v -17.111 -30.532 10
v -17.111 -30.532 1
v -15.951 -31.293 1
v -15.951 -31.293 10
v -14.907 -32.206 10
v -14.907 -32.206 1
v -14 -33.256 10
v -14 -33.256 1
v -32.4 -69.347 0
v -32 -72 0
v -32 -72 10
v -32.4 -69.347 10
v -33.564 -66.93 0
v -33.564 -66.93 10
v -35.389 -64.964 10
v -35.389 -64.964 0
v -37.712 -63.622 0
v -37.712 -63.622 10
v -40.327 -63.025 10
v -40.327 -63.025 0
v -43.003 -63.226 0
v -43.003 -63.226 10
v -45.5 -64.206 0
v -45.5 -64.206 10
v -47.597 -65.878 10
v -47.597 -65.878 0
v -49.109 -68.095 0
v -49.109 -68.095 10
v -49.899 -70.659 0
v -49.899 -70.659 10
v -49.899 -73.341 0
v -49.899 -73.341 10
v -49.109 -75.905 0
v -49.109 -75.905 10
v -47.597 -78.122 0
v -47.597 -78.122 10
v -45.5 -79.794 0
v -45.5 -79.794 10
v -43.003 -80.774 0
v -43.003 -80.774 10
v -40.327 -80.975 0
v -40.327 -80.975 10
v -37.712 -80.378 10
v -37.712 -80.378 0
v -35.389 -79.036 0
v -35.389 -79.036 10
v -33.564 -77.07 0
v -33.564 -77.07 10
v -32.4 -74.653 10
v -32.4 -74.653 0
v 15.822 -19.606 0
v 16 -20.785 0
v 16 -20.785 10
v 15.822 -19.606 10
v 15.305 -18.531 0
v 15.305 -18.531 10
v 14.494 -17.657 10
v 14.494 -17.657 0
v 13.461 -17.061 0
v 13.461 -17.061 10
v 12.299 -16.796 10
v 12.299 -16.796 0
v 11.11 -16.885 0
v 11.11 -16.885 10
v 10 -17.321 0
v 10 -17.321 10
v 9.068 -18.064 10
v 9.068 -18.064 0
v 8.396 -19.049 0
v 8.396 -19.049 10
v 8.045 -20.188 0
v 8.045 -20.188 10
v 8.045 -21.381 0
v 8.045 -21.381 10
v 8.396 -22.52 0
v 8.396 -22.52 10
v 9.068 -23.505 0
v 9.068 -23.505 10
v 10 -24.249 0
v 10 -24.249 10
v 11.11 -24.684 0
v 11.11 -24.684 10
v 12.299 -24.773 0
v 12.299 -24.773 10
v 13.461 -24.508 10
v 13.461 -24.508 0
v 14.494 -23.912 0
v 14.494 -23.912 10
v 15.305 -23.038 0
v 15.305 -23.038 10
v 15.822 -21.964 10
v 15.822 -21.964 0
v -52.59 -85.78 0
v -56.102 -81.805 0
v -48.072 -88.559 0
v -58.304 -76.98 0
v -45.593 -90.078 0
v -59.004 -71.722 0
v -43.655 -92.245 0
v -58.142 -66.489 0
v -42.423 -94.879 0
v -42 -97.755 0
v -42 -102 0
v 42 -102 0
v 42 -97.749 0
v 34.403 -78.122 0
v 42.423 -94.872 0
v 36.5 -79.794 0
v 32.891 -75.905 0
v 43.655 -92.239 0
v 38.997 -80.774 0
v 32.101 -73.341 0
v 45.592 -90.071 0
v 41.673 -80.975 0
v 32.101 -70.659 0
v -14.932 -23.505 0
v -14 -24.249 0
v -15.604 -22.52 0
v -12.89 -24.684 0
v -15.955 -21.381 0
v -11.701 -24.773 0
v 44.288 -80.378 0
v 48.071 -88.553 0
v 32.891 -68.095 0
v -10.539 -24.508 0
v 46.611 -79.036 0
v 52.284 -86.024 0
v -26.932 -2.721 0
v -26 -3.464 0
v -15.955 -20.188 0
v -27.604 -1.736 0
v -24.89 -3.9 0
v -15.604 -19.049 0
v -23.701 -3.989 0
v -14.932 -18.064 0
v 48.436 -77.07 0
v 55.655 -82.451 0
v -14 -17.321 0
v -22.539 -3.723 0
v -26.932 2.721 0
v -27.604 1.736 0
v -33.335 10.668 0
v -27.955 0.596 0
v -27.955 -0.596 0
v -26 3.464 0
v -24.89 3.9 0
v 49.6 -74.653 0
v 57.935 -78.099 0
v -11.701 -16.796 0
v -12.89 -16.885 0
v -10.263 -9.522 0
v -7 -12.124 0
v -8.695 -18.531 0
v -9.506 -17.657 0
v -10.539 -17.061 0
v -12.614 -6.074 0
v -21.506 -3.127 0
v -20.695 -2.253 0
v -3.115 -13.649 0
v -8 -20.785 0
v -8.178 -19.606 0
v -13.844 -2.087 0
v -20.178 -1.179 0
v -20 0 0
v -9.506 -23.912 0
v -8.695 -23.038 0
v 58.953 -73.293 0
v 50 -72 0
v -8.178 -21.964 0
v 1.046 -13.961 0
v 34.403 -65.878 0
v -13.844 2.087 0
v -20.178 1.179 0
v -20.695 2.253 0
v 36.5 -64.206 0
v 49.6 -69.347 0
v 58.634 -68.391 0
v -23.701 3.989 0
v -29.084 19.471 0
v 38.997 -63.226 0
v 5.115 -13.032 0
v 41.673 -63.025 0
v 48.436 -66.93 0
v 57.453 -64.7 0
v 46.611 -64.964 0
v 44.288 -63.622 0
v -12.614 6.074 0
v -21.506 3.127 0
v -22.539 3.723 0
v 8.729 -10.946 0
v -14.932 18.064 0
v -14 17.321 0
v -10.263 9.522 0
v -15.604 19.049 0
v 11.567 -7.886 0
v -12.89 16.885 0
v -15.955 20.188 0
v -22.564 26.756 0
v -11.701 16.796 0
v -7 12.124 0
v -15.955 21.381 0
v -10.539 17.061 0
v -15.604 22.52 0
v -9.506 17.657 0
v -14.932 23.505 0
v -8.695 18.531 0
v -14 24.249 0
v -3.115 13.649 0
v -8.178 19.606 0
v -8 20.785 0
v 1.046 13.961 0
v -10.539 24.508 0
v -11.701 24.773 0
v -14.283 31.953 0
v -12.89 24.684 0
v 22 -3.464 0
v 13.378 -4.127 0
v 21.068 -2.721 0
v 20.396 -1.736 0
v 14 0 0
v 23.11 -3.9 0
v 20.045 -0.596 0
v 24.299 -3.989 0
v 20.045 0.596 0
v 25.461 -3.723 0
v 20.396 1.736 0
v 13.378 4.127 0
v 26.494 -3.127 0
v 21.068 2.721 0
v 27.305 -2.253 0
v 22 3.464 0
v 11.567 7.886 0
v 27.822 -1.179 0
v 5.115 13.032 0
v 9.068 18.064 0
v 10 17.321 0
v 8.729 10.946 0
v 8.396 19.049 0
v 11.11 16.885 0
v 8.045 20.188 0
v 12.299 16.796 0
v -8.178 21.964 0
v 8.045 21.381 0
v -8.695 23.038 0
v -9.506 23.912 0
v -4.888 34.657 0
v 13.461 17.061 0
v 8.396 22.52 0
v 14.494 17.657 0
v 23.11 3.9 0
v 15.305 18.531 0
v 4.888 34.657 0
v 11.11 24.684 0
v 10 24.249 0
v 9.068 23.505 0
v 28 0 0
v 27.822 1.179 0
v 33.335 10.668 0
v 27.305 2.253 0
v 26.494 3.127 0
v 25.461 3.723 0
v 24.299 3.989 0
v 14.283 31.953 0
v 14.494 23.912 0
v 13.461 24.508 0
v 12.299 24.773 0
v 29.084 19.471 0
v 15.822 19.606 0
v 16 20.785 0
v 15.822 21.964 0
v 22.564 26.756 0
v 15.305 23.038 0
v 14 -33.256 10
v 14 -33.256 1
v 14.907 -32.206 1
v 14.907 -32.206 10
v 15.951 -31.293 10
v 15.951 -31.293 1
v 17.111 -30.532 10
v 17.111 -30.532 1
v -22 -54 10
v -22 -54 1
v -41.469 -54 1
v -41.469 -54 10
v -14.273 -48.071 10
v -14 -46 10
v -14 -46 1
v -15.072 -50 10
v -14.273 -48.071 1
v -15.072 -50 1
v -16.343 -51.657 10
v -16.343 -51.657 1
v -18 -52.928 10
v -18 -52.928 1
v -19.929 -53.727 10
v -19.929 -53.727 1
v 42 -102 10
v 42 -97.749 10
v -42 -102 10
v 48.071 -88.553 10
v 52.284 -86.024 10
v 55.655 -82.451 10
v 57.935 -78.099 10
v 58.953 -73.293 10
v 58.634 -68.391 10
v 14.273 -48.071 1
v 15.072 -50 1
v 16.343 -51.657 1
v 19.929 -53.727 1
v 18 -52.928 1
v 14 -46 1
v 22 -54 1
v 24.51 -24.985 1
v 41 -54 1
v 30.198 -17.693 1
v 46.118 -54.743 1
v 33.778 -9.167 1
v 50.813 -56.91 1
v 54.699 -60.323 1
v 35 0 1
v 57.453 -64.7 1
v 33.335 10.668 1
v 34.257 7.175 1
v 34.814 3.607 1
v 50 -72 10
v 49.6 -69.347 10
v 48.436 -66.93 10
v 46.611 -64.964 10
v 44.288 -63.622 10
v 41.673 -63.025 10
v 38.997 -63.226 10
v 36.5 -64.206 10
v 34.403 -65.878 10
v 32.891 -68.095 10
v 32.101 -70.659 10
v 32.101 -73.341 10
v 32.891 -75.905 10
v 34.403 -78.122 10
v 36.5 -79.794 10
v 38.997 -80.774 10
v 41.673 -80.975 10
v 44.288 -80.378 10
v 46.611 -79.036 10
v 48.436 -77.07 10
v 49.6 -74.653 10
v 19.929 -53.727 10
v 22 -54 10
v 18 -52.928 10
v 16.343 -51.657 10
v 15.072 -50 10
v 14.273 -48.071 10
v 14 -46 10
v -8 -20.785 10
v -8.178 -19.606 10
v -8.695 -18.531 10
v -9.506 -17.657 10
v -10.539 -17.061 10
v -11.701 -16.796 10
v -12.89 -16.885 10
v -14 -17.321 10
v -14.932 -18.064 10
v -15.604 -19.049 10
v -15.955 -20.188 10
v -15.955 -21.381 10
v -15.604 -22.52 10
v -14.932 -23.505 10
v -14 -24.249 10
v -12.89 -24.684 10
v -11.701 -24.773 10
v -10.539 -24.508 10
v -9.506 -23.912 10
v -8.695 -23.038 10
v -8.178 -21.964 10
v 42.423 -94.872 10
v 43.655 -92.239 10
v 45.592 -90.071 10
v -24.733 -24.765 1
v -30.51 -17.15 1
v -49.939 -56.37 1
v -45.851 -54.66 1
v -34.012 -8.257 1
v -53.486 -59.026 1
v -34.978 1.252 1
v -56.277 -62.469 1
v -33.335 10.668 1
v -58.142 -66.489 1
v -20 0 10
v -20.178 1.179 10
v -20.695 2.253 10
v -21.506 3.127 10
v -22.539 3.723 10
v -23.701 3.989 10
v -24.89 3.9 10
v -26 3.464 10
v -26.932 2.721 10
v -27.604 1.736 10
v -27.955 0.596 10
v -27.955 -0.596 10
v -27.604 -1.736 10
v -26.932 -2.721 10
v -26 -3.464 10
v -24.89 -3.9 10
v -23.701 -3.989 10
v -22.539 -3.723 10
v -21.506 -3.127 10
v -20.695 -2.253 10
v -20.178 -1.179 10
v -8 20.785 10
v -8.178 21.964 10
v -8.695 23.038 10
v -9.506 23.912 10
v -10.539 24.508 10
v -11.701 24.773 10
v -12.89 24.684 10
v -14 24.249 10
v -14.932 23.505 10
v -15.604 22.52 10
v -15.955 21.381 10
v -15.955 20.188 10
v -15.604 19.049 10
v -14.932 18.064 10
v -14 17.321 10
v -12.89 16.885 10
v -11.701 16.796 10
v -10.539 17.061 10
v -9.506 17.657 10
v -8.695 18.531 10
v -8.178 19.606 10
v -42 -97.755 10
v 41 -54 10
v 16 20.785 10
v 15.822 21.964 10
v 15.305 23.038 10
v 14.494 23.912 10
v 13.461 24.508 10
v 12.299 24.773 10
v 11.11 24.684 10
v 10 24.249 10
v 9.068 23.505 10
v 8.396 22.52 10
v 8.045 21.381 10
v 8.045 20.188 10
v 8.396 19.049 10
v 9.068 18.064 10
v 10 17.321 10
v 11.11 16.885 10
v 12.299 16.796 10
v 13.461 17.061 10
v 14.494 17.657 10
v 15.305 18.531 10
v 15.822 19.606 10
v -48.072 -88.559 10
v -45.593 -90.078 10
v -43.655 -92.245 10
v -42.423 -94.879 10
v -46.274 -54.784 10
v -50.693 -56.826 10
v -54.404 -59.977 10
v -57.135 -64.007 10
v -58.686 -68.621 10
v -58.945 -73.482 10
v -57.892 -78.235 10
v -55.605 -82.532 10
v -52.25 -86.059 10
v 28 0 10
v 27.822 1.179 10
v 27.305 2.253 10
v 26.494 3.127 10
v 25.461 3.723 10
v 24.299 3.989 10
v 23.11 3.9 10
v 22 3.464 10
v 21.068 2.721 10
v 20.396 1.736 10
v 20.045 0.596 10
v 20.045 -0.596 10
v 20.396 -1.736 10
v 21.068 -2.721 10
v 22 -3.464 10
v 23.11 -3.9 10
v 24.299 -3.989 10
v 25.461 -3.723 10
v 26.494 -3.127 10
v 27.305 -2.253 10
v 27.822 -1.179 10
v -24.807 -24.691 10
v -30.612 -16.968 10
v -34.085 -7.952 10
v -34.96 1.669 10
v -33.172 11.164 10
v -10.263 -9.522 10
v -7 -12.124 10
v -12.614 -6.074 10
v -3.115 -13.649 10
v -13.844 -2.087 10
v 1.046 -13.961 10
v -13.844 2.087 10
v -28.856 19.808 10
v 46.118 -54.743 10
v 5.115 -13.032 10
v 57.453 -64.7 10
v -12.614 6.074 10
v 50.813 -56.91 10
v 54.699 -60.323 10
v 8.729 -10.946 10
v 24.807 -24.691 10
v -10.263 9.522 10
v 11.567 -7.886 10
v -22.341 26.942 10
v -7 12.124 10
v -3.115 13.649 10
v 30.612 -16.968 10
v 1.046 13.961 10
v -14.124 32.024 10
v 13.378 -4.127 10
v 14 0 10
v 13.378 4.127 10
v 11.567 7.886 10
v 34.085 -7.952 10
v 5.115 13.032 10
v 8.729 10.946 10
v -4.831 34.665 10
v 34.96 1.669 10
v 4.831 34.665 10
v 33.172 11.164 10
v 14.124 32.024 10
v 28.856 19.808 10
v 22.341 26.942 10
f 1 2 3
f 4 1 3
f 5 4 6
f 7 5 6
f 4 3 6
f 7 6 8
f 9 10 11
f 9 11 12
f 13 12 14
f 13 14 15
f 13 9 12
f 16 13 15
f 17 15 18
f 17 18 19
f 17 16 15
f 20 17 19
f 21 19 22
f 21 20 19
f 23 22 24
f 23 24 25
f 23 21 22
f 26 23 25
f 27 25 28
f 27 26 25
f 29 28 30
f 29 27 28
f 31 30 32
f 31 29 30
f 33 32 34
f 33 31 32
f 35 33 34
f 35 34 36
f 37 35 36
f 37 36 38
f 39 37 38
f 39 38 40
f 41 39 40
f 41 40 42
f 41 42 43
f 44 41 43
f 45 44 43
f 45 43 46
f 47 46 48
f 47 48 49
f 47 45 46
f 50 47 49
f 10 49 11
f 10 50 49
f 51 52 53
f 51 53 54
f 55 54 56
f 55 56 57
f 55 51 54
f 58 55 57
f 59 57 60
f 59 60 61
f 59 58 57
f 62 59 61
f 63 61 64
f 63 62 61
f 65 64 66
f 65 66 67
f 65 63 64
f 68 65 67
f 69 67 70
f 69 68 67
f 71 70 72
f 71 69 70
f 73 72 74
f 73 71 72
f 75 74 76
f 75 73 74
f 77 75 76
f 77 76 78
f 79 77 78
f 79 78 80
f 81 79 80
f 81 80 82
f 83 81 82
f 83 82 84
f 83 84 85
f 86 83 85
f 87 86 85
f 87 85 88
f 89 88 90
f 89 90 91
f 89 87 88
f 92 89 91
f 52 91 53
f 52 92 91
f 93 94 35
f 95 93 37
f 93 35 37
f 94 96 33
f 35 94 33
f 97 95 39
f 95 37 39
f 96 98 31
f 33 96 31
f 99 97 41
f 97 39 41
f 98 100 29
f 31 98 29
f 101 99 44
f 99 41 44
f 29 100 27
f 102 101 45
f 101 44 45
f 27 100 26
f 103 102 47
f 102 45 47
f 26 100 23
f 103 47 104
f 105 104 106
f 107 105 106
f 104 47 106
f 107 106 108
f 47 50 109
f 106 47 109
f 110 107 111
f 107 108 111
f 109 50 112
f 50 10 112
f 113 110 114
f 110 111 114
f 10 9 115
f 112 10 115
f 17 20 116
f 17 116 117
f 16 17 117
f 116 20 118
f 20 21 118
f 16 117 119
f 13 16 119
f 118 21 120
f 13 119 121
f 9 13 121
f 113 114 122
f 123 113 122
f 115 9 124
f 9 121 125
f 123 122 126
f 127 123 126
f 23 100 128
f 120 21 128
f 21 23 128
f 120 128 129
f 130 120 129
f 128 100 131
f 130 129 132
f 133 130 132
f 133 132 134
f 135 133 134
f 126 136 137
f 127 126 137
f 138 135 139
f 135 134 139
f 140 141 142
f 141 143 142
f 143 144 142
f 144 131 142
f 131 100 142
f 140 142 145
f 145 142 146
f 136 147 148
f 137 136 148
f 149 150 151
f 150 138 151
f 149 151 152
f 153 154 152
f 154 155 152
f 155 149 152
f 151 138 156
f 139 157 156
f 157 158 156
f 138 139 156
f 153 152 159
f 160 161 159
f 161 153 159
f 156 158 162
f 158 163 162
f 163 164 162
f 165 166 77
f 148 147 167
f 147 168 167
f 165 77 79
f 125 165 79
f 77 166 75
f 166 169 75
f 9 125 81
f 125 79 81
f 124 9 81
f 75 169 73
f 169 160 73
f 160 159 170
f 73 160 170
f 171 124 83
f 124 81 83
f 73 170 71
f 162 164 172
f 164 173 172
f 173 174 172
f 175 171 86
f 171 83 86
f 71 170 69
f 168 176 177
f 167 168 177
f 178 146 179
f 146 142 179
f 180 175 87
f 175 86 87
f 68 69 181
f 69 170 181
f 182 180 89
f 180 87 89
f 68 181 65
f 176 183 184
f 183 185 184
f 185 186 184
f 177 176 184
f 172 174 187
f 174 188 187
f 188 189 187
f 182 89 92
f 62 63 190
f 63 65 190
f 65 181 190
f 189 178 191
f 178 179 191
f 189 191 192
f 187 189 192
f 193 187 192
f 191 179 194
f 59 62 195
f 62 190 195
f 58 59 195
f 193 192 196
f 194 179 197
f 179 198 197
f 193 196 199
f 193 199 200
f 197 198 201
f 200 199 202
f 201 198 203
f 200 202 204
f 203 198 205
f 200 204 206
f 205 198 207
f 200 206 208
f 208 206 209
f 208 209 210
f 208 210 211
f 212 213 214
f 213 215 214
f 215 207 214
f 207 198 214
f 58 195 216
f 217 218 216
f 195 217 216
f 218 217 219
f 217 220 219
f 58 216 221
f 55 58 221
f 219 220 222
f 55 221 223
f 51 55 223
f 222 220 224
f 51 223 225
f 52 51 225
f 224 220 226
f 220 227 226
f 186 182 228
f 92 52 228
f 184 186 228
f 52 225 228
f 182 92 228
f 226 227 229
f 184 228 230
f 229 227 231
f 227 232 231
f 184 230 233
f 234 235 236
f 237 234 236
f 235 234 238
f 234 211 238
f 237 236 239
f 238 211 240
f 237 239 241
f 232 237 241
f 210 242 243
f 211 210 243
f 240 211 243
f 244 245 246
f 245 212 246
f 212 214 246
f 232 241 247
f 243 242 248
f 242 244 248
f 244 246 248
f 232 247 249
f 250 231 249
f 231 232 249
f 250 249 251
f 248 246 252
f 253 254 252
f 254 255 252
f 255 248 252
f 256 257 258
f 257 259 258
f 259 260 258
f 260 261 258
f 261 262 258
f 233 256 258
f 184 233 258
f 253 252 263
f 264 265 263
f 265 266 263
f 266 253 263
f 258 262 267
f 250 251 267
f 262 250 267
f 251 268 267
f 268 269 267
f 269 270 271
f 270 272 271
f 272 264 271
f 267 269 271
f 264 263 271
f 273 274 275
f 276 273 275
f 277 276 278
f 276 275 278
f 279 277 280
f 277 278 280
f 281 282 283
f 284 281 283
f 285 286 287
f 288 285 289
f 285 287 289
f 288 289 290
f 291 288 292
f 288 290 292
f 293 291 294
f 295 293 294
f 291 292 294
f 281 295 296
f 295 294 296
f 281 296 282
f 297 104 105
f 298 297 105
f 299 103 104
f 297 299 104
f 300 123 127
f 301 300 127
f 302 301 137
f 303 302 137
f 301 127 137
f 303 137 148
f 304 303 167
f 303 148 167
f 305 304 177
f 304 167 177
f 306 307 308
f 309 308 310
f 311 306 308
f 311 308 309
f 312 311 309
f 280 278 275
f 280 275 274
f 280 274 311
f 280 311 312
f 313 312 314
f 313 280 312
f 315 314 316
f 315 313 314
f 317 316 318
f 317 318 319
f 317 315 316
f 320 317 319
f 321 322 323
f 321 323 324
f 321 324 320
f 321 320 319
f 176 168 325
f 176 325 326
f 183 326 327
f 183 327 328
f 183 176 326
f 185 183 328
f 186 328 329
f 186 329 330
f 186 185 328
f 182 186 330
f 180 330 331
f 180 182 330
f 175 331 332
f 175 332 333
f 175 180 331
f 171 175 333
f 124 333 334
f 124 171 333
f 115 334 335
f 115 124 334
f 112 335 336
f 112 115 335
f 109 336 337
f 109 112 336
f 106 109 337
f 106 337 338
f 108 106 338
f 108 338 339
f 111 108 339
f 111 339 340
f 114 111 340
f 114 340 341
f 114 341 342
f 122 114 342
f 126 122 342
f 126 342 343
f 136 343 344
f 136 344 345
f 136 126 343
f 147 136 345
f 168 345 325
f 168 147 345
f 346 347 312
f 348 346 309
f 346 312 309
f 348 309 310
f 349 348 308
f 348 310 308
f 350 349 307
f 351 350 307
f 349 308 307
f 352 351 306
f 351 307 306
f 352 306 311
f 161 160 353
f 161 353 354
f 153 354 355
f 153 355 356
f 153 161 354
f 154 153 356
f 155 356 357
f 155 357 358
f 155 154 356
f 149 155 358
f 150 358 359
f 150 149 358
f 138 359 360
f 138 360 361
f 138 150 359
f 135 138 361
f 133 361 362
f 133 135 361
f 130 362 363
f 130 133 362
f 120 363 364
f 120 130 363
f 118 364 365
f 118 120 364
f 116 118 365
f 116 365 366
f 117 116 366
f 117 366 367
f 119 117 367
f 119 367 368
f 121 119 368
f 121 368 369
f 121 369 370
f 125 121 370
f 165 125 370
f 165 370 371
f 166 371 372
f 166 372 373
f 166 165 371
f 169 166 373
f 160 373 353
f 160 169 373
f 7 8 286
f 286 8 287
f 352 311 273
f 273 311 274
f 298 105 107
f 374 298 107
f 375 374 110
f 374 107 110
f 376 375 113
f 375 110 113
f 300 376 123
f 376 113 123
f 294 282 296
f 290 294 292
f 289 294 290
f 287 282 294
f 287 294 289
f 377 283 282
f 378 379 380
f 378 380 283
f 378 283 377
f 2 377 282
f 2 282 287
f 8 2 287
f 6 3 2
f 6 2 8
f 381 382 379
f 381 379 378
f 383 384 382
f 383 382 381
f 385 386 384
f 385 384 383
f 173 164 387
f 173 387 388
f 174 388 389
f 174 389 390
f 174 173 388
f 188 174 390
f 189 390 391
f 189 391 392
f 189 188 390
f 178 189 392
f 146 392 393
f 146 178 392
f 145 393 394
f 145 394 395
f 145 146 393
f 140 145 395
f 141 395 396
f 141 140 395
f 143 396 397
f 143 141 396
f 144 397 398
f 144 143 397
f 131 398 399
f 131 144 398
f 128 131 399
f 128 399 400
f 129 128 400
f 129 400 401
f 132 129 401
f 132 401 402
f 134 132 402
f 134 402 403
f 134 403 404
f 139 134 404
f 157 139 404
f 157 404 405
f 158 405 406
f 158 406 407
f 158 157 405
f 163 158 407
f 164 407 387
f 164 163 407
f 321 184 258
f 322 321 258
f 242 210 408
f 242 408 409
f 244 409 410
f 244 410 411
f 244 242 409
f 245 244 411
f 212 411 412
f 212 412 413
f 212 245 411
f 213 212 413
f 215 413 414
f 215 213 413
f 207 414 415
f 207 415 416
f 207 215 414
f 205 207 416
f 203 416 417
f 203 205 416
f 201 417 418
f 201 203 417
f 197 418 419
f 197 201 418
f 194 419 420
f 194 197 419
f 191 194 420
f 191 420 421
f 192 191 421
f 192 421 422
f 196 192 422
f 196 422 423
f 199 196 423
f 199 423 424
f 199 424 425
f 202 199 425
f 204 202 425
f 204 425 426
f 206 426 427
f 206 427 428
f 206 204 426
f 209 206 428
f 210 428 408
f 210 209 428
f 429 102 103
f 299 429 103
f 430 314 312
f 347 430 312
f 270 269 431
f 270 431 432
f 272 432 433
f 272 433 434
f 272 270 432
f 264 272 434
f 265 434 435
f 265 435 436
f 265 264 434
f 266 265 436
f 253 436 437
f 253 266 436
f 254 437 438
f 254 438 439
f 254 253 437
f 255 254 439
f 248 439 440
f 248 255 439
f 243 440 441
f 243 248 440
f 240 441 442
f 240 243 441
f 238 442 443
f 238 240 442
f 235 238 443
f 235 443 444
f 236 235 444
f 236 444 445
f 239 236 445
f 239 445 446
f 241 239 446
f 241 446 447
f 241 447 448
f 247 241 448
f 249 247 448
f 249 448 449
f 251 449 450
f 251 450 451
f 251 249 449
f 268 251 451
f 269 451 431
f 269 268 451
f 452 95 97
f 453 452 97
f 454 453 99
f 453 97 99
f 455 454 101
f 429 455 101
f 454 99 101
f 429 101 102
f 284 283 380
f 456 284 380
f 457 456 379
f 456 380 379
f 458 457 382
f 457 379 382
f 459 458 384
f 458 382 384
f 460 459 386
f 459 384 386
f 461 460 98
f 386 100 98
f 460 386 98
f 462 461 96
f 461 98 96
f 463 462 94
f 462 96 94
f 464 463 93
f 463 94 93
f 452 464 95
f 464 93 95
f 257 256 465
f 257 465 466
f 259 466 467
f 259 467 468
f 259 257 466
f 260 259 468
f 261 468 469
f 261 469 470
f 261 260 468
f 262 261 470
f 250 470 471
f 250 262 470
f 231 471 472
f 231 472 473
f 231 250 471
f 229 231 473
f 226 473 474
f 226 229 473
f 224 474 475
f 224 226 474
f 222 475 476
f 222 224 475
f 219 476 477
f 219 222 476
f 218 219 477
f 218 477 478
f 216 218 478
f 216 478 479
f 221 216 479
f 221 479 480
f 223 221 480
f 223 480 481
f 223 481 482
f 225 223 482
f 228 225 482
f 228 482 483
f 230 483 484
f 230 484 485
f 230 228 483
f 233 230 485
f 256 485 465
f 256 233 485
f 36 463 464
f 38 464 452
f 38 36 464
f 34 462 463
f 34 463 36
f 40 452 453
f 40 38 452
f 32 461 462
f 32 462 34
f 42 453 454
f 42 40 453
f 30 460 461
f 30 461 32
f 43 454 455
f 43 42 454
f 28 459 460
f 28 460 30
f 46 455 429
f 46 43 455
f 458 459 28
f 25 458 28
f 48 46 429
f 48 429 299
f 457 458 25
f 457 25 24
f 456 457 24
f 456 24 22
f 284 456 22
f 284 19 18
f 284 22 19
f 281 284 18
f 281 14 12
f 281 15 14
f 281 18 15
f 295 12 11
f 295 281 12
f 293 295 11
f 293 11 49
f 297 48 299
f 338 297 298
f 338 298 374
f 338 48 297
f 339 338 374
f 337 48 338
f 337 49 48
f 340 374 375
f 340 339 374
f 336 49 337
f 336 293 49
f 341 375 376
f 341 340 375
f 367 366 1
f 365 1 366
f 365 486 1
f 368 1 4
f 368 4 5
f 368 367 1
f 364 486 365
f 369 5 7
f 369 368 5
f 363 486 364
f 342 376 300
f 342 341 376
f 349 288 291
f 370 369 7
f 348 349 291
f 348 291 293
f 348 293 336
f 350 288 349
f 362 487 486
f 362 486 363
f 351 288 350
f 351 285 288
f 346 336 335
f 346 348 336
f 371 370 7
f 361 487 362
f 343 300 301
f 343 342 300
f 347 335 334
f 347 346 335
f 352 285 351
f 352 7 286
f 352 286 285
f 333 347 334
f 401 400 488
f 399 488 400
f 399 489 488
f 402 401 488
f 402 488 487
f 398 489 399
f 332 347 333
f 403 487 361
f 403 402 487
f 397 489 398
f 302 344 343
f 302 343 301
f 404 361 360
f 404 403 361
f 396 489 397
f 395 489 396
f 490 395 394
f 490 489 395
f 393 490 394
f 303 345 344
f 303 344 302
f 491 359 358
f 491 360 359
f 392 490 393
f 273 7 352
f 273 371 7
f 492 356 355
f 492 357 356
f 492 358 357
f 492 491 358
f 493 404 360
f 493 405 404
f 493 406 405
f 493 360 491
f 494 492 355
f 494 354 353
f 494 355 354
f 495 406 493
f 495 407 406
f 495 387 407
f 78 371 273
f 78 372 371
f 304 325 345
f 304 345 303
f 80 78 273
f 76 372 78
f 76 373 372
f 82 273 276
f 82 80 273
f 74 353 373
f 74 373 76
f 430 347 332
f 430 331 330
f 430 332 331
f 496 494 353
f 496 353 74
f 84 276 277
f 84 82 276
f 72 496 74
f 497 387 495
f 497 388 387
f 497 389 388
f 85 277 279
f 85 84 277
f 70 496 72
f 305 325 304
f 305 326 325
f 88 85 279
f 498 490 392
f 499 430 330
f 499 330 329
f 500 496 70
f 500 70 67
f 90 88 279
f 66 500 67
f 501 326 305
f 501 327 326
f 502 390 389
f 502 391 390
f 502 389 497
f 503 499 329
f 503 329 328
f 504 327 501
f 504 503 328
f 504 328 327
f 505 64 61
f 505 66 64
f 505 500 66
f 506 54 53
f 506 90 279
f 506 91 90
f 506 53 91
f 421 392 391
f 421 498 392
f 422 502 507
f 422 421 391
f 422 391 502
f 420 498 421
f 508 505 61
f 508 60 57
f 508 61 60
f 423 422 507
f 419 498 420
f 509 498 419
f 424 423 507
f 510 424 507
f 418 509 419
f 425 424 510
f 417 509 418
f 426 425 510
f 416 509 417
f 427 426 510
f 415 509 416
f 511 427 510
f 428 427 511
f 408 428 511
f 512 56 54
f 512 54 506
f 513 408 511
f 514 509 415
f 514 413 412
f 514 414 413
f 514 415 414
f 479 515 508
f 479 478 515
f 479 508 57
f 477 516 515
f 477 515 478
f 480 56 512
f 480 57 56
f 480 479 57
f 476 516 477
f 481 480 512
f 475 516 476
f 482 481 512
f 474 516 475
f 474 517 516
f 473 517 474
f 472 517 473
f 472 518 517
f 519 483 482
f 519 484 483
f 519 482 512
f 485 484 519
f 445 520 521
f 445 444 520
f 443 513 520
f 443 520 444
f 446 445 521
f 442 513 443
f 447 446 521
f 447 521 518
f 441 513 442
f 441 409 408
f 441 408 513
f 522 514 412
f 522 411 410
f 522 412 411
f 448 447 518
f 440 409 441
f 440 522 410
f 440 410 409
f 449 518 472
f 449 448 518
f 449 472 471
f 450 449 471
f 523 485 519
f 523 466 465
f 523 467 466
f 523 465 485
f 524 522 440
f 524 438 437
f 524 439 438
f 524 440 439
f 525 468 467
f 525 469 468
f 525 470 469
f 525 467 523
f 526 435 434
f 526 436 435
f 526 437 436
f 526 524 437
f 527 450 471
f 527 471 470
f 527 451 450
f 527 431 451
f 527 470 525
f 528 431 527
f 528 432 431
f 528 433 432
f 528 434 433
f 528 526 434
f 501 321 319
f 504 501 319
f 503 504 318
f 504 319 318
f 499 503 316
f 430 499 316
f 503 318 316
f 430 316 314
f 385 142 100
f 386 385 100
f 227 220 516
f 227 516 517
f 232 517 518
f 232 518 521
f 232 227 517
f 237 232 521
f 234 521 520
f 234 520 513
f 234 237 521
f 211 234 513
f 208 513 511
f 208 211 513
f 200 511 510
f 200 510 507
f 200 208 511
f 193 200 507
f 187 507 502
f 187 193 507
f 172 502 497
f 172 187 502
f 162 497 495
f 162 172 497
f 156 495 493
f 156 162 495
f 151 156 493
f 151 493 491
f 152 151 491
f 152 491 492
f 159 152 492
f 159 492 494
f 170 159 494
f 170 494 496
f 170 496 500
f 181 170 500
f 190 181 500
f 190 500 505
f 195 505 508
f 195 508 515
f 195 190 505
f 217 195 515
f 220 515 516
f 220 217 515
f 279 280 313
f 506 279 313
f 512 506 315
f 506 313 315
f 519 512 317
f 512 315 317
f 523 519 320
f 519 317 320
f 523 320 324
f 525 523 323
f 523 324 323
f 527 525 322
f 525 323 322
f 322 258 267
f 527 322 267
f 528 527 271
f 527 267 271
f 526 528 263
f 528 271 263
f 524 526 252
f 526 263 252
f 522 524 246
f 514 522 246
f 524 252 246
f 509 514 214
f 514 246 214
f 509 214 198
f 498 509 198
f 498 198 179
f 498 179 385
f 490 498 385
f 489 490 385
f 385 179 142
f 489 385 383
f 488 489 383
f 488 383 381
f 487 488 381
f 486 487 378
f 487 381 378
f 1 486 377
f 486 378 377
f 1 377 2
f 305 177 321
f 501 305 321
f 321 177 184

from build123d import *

# Parameters (mm, degrees)
SKETCH1_R           = 9
SKETCH1_R_2         = 4
SKETCH1_R_3         = 14
BOSS_EXTRUDE1_DEPTH = 10
BOSS_EXTRUDE2_DEPTH = 1


with BuildPart() as part:
    # Sketch1 → Boss-Extrude1 (new body)
    with BuildSketch(Plane.XY):
        with BuildLine():
            Line((-22, -54), (-41.469262149, -54))
            ThreePointArc((-41.469262149, -54), (-58.686185522, -68.620791716), (-48.072286471, -88.559075187))
            ThreePointArc((-48.072286471, -88.559075187), (-43.655027403, -92.245315871), (-42, -97.755436773))
            Line((-42, -97.755436773), (-42, -102))
            Line((-42, -102), (42, -102))
            Line((42, -102), (42, -97.748786379))
            ThreePointArc((42, -97.748786379), (43.654770396, -92.239054729), (48.071428571, -88.552791244))
            ThreePointArc((48.071428571, -88.552791244), (56.944278467, -80.353441457), (58.634486701, -68.391000304))
            Line((58.634486701, -68.391000304), (57.453450889, -64.700414132))
            ThreePointArc((57.453450889, -64.700414132), (50.813446244, -56.910391893), (41, -54))
            Line((41, -54), (22, -54))
            ThreePointArc((22, -54), (16.343145751, -51.656854249), (14, -46))
            Line((14, -46), (14, -33.255572853))
            ThreePointArc((14, -33.255572853), (15.413257736, -31.731290406), (17.111111111, -30.532112219))
            ThreePointArc((17.111111111, -30.532112219), (0, 35), (-17.111111111, -30.532112219))
            ThreePointArc((-17.111111111, -30.532112219), (-15.413257736, -31.731290406), (-14, -33.255572853))
            Line((-14, -33.255572853), (-14, -46))
            ThreePointArc((-14, -46), (-16.343145751, -51.656854249), (-22, -54))
        make_face()
        with Locations((-41, -72)):
            Circle(SKETCH1_R, mode=Mode.SUBTRACT)
        with Locations((41, -72)):
            Circle(SKETCH1_R, mode=Mode.SUBTRACT)
        with Locations((12, 20.784609691)):
            Circle(SKETCH1_R_2, mode=Mode.SUBTRACT)
        with Locations((-12, -20.784609691)):
            Circle(SKETCH1_R_2, mode=Mode.SUBTRACT)
        with Locations((-24, 0)):
            Circle(SKETCH1_R_2, mode=Mode.SUBTRACT)
        with Locations((-12, 20.784609691)):
            Circle(SKETCH1_R_2, mode=Mode.SUBTRACT)
        with Locations((12, -20.784609691)):
            Circle(SKETCH1_R_2, mode=Mode.SUBTRACT)
        Circle(SKETCH1_R_3, mode=Mode.SUBTRACT)
        with Locations((24, 0)):
            Circle(SKETCH1_R_2, mode=Mode.SUBTRACT)
    extrude(amount=BOSS_EXTRUDE1_DEPTH)

    # Sketch1<3> → Boss-Extrude2 (add)
    with BuildSketch(Plane.XY):
        with BuildLine():
            ThreePointArc((-58.141884058, -66.488555733), (-51.79486562, -57.58850864), (-41.469262149, -54))
            Line((-41.469262149, -54), (-22, -54))
            ThreePointArc((-22, -54), (-16.343145751, -51.656854249), (-14, -46))
            Line((-14, -46), (-14, -33.255572853))
            ThreePointArc((-14, -33.255572853), (-15.413257736, -31.731290406), (-17.111111111, -30.532112219))
            ThreePointArc((-17.111111111, -30.532112219), (-32.56606191, -12.823868827), (-33.334718679, 10.667545668))
            Line((-33.334718679, 10.667545668), (-58.141884058, -66.488555733))
        make_face()
        with BuildLine():
            Line((57.453450889, -64.700414132), (33.334718679, 10.667545668))
            ThreePointArc((33.334718679, 10.667545668), (32.56606191, -12.823868827), (17.111111111, -30.532112219))
            ThreePointArc((17.111111111, -30.532112219), (15.413257736, -31.731290406), (14, -33.255572853))
            Line((14, -33.255572853), (14, -46))
            ThreePointArc((14, -46), (16.343145751, -51.656854249), (22, -54))
            Line((22, -54), (41, -54))
            ThreePointArc((41, -54), (50.813446244, -56.910391893), (57.453450889, -64.700414132))
        make_face()
    extrude(amount=BOSS_EXTRUDE2_DEPTH)


solid = part.part
